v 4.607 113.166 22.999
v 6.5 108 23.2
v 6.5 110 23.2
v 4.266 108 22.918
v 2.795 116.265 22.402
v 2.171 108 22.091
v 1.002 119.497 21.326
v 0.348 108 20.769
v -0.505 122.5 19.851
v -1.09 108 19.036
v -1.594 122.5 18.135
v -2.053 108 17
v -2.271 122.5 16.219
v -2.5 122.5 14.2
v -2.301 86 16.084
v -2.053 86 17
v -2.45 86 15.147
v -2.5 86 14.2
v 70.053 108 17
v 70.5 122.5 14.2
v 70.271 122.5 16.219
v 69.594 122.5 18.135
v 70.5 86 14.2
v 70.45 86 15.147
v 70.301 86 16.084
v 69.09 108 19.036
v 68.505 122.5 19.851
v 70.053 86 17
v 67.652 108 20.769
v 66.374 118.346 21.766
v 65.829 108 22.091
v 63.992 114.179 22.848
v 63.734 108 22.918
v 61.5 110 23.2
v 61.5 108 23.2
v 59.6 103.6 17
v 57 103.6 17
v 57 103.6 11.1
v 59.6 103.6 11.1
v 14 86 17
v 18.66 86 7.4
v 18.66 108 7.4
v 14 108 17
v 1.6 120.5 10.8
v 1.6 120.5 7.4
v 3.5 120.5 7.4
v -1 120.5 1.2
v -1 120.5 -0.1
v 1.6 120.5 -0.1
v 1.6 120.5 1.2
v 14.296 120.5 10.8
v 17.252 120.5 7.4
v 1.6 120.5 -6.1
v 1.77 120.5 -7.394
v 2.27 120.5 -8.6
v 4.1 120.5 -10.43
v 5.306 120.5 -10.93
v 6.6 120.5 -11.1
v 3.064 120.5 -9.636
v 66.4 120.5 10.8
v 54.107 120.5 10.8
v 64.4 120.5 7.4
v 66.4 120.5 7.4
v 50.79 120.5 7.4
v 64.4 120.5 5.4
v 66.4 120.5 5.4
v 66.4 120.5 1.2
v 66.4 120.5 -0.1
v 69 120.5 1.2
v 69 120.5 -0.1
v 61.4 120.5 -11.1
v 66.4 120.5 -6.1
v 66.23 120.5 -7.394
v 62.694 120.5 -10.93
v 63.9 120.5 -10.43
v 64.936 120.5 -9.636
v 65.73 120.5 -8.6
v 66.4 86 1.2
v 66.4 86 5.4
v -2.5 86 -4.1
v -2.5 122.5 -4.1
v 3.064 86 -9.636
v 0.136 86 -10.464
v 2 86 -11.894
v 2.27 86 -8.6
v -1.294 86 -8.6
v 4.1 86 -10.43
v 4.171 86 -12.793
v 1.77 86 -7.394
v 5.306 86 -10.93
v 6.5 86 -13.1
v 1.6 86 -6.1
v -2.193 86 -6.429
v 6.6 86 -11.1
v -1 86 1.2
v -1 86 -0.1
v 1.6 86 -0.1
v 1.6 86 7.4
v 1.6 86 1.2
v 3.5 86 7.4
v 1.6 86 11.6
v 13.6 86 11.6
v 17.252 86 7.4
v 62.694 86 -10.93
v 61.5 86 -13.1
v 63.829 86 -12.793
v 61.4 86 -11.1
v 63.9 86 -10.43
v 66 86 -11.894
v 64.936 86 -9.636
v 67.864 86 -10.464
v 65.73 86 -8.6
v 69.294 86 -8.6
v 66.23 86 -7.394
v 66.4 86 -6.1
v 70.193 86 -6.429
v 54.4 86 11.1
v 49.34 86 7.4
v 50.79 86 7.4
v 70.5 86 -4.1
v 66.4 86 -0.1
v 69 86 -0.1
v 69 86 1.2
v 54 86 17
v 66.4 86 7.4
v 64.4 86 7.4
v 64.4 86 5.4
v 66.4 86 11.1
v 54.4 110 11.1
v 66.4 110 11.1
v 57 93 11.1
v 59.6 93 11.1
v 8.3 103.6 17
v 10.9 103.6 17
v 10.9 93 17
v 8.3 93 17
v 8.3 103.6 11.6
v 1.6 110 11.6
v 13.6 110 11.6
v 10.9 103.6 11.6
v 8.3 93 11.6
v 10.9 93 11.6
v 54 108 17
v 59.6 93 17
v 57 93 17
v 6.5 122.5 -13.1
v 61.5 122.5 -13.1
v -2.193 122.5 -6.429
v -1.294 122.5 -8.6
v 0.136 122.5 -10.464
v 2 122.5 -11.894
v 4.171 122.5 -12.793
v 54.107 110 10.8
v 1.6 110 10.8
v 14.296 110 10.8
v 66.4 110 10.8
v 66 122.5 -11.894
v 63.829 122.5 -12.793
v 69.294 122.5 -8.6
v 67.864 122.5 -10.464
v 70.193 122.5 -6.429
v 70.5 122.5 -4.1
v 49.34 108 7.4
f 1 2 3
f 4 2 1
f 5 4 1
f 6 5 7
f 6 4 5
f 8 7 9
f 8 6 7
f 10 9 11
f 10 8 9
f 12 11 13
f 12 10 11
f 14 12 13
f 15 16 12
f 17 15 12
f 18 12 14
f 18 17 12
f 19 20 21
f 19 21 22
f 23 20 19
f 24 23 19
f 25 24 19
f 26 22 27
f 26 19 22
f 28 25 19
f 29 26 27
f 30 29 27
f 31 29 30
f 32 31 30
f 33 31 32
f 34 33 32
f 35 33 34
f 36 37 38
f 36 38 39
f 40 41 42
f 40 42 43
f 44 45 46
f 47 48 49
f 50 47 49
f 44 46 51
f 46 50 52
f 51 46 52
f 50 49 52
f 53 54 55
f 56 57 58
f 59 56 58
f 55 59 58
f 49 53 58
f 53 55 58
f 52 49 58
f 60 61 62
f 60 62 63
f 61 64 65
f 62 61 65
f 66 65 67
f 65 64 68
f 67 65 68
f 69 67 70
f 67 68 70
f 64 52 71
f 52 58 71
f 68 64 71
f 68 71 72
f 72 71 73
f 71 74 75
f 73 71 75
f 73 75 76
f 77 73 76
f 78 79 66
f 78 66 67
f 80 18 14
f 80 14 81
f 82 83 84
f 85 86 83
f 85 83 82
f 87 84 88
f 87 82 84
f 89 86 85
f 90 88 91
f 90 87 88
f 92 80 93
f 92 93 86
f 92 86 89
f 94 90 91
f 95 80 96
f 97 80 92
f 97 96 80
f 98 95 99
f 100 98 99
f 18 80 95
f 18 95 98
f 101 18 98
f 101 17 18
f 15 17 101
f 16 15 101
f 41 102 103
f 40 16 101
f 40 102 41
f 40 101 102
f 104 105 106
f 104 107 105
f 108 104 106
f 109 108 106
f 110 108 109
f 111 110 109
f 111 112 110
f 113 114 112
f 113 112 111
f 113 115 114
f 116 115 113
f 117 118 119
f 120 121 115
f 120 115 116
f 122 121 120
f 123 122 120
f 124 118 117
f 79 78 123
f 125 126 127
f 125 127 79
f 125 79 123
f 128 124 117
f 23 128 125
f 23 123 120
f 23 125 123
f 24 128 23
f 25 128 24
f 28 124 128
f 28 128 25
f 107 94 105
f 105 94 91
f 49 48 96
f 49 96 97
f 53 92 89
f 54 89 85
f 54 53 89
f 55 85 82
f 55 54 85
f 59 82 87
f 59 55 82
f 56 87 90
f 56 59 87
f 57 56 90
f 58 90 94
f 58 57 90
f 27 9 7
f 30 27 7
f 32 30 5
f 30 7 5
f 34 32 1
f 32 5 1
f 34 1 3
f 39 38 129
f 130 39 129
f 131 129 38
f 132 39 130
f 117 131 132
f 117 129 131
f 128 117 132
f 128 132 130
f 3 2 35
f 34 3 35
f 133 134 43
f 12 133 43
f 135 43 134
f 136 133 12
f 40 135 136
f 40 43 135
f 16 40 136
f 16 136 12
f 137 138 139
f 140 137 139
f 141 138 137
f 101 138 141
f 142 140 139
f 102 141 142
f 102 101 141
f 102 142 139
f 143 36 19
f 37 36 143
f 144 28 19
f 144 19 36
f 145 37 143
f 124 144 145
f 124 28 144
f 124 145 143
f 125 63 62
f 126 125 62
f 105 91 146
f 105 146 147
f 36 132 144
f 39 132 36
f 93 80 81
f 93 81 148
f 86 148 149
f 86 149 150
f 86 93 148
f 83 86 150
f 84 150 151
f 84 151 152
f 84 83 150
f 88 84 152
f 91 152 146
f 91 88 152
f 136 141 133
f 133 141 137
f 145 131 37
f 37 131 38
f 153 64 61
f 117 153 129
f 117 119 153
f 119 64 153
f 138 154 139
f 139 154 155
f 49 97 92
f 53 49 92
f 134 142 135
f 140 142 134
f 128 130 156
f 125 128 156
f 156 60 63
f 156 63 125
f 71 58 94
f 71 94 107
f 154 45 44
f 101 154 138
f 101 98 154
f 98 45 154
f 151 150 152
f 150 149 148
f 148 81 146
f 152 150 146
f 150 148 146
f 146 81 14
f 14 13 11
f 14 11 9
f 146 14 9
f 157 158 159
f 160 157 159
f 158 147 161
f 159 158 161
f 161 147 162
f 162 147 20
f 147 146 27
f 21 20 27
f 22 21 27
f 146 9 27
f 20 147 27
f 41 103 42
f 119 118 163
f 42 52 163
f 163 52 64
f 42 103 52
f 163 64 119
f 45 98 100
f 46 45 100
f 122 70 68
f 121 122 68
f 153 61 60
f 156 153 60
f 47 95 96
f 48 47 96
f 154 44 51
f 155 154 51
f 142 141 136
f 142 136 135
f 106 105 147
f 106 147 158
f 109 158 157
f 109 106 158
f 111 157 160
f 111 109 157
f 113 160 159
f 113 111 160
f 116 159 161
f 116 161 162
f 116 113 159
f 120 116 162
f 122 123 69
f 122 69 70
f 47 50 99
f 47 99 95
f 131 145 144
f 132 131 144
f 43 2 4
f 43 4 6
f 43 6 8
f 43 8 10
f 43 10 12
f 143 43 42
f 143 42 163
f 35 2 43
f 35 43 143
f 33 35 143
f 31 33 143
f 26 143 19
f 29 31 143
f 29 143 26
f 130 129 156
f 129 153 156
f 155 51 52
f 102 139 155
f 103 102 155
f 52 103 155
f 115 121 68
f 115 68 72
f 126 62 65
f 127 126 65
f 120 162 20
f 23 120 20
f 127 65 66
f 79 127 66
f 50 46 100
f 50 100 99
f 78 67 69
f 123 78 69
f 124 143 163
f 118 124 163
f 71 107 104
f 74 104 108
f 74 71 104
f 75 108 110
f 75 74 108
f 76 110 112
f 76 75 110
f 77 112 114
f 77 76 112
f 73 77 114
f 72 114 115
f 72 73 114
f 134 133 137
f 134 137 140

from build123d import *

# Parameters (mm, degrees)
BOX030_W                             = 48
BOX030_H                             = 60
BOX030_DEPTH                         = 10
BOX028_W                             = 2.6
BOX028_H                             = 10.6
BOX028_DEPTH                         = 15
BOX027_W                             = 2.6
BOX027_H                             = 10.6
BOX027_DEPTH                         = 15
EXTRUDE076_DEPTH                     = 34.5
EXTRUDE076_ONTO_SKETCH082_ROLL_ANGLE = 90
EXTRUDE075_DEPTH                     = 34.5
EXTRUDE075_ONTO_SKETCH081_ROLL_ANGLE = 90
EXTRUDE077_DEPTH                     = 10.5
EXTRUDE077_ONTO_SKETCH083_ROLL_ANGLE = 90
EXTRUDE080_DEPTH                     = 100
EXTRUDE079_DEPTH                     = 2
EXTRUDE079_ONTO_SKETCH085_ROLL_ANGLE = 90
BOX029_W                             = 80
BOX029_H                             = 28
BOX029_DEPTH                         = 30
EXTRUDE078_DEPTH                     = 35.5
EXTRUDE078_ONTO_SKETCH084_ROLL_ANGLE = 90
BOX032_W                             = 48
BOX032_H                             = 60
BOX032_DEPTH                         = 35
BOX031_W                             = 48
BOX031_H                             = 60
BOX031_DEPTH                         = 35
BOX033_W                             = 48
BOX033_H                             = 60
BOX033_DEPTH                         = 35
EXTRUDE081_DEPTH                     = 2
EXTRUDE081_ONTO_SKETCH087_ROLL_ANGLE = 90


with BuildPart() as cube:
    # Box030 → Box030 (new body)
    with BuildSketch(Plane(origin=(11, 60.5, -2.6), x_dir=(1, 0, 0), z_dir=(0, 0, 1))):
        with Locations((24, 30)):
            Rectangle(BOX030_W, BOX030_H)
    extrude(amount=BOX030_DEPTH)


with BuildPart() as control_cutout_rec003:
    # Box028 → Box028 (new body)
    with BuildSketch(Plane(origin=(57, 93, 9), x_dir=(1, 0, 0), z_dir=(0, 0, 1))):
        with Locations((1.3, 5.3)):
            Rectangle(BOX028_W, BOX028_H)
    extrude(amount=BOX028_DEPTH)


with BuildPart() as button_cutouts_rec001:
    # Box027 → Box027 (new body)
    with BuildSketch(Plane(origin=(8.3, 93, 9), x_dir=(1, 0, 0), z_dir=(0, 0, 1))):
        with Locations((1.3, 5.3)):
            Rectangle(BOX027_W, BOX027_H)
    extrude(amount=BOX027_DEPTH)

    # Fusion041: union control_cutout_rec003
    add(control_cutout_rec003.part)


with BuildPart() as screen_cutout_shp002:
    # Sketch082 as drawn → Extrude076 (new)
    with BuildSketch(Plane.XY):
        Polygon((14, 17), (-5.5, 17), (-5.5, 25.6), (73.5, 25.6), (73.5, 17), (54, 17), (49, 6.7), (49, 6.6), (19, 6.6), (19, 6.7), align=None)
    extrude(amount=-EXTRUDE076_DEPTH)


with BuildPart() as screen_cutout_shp002_1:
    # Extrude076 onto Sketch082 roll: moved
    add(screen_cutout_shp002.part.rotate(Axis((0, 0, 0), (1, 0, 0)), EXTRUDE076_ONTO_SKETCH082_ROLL_ANGLE))


with BuildPart() as screen_cutout_shp002_2:
    # Extrude076 onto Sketch082 placement: moved
    add(screen_cutout_shp002_1.part.moved(Location((0, 86, 0))))


with BuildPart() as screen_frame002:
    # Sketch081 as drawn → Extrude075 (new)
    with BuildSketch(Plane.XY):
        with BuildLine():
            Line((-2.5, 14.2), (-2.5, 10.6))
            Line((-2.5, 10.6), (1.6, 10.6))
            Line((1.6, 10.6), (1.6, 11.6))
            Line((1.6, 11.6), (13.6, 11.6))
            Line((13.6, 11.6), (17.6, 7))
            Line((17.6, 7), (50.4, 7))
            Line((50.4, 7), (54.4, 11.1))
            Line((54.4, 11.1), (66.4, 11.1))
            Line((66.4, 11.1), (66.4, 10.6))
            Line((66.4, 10.6), (70.5, 10.6))
            Line((70.5, 10.6), (70.5, 14.2))
            ThreePointArc((70.5, 14.2), (67.863961, 20.563961), (61.5, 23.2))
            Line((6.5, 23.2), (61.5, 23.2))
            ThreePointArc((6.5, 23.2), (0.136039, 20.563961), (-2.5, 14.2))
        make_face()
    extrude(amount=-EXTRUDE075_DEPTH)


with BuildPart() as screen_frame002_1:
    # Extrude075 onto Sketch081 roll: moved
    add(screen_frame002.part.rotate(Axis((0, 0, 0), (1, 0, 0)), EXTRUDE075_ONTO_SKETCH081_ROLL_ANGLE))


with BuildPart() as screen_frame002_2:
    # Extrude075 onto Sketch081 placement: moved
    add(screen_frame002_1.part.moved(Location((0, 86, 0))))

    # Cut031: cut screen_cutout_shp002
    add(screen_cutout_shp002_2.part, mode=Mode.SUBTRACT)


with BuildPart() as cut032:
    # Sketch083 as drawn → Extrude077 (new)
    with BuildSketch(Plane.XY):
        Polygon((13.6, 12.2), (17.6, 7.2), (50.4, 7.2), (54.4, 12.2), align=None)
    extrude(amount=-EXTRUDE077_DEPTH)


with BuildPart() as cut032_1:
    # Extrude077 onto Sketch083 roll: moved
    add(cut032.part.rotate(Axis((0, 0, 0), (1, 0, 0)), EXTRUDE077_ONTO_SKETCH083_ROLL_ANGLE))


with BuildPart() as cut032_2:
    # Extrude077 onto Sketch083 placement: moved
    add(cut032_1.part.moved(Location((0, 110, 0))))

    # Fusion042: union screen_frame002
    add(screen_frame002_2.part)

    # Cut032: cut button_cutouts_rec001
    add(button_cutouts_rec001.part, mode=Mode.SUBTRACT)


with BuildPart() as round_cut002:
    # Sketch086 → Extrude080 (new body)
    with BuildSketch(Plane.YZ.offset(-14)):
        with BuildLine():
            Line((100, 23.2), (100, 26.2))
            Line((100, 26.2), (138, 26.2))
            Line((138, 26.2), (138, -11.8))
            Line((138, -11.8), (135, -11.8))
            Line((135, -11.8), (135, -1.8))
            ThreePointArc((135, -1.8), (127.67767, 15.87767), (110, 23.2))
            Line((100, 23.2), (110, 23.2))
        make_face()
    extrude(amount=EXTRUDE080_DEPTH)


with BuildPart() as extrude079:
    # Sketch085 as drawn → Extrude079 (new)
    with BuildSketch(Plane.XY):
        with BuildLine():
            Line((-2.5, 14.2), (-2.5, -4.1))
            ThreePointArc((-2.5, -4.1), (0.136039, -10.463961), (6.5, -13.1))
            Line((6.5, -13.1), (61.5, -13.1))
            ThreePointArc((61.5, -13.1), (67.863961, -10.463961), (70.5, -4.1))
            Line((70.5, -4.1), (70.5, 14.2))
            ThreePointArc((70.5, 14.2), (67.863961, 20.563961), (61.5, 23.2))
            Line((6.5, 23.2), (61.5, 23.2))
            ThreePointArc((6.5, 23.2), (0.136039, 20.563961), (-2.5, 14.2))
        make_face()
    extrude(amount=-EXTRUDE079_DEPTH)


with BuildPart() as extrude079_1:
    # Extrude079 onto Sketch085 roll: moved
    add(extrude079.part.rotate(Axis((0, 0, 0), (1, 0, 0)), EXTRUDE079_ONTO_SKETCH085_ROLL_ANGLE))


with BuildPart() as extrude079_2:
    # Extrude079 onto Sketch085 placement: moved
    add(extrude079_1.part.moved(Location((0, 120, 0))))


with BuildPart() as extrude079_3:
    # Extrude079 placement: moved
    add(extrude079_2.part.moved(Location((0, 0.5, 0))))


with BuildPart() as cube008:
    # Box029 → Box029 (new body)
    with BuildSketch(Plane(origin=(-5, 82, 10.6), x_dir=(1, 0, 0), z_dir=(0, 0, 1))):
        with Locations((40, 14)):
            Rectangle(BOX029_W, BOX029_H)
    extrude(amount=BOX029_DEPTH)


with BuildPart() as shell_upper004:
    # Sketch084 as drawn → Extrude078 (new)
    with BuildSketch(Plane.XY):
        with BuildLine():
            Line((-2.5, 14.2), (-2.5, -4.1))
            ThreePointArc((-2.5, -4.1), (0.136039, -10.463961), (6.5, -13.1))
            Line((6.5, -13.1), (61.5, -13.1))
            ThreePointArc((61.5, -13.1), (67.863961, -10.463961), (70.5, -4.1))
            Line((70.5, -4.1), (70.5, 14.2))
            ThreePointArc((70.5, 14.2), (67.863961, 20.563961), (61.5, 23.2))
            Line((6.5, 23.2), (61.5, 23.2))
            ThreePointArc((6.5, 23.2), (0.136039, 20.563961), (-2.5, 14.2))
        make_face()
        with BuildLine():
            Line((1.6, 1.2), (-1, 1.2))
            Line((-1, 1.2), (-1, -0.1))
            Line((-1, -0.1), (1.6, -0.1))
            Line((1.6, -0.1), (1.6, -6.1))
            ThreePointArc((1.6, -6.1), (3.064466, -9.635534), (6.6, -11.1))
            Line((6.6, -11.1), (61.4, -11.1))
            ThreePointArc((61.4, -11.1), (64.935534, -9.635534), (66.4, -6.1))
            Line((66.4, -0.1), (66.4, -6.1))
            Line((69, -0.1), (66.4, -0.1))
            Line((69, 1.2), (69, -0.1))
            Line((66.4, 1.2), (69, 1.2))
            Line((66.4, 5.4), (66.4, 1.2))
            Line((64.4, 5.4), (66.4, 5.4))
            Line((64.4, 7.4), (64.4, 5.4))
            Line((66.4, 7.4), (64.4, 7.4))
            Line((66.4, 10.6), (66.4, 7.4))
            Line((66.4, 10.6), (66.4, 10.8))
            Line((66.4, 10.8), (64.5, 10.8))
            Line((64.5, 10.8), (3.5, 10.8))
            Line((1.6, 10.8), (3.5, 10.8))
            Line((1.6, 10.6), (1.6, 10.8))
            Line((1.6, 10.6), (1.6, 7.4))
            Line((1.6, 7.4), (3.5, 7.4))
            Line((3.5, 7.4), (1.6, 1.2))
        make_face(mode=Mode.SUBTRACT)
    extrude(amount=EXTRUDE078_DEPTH)


with BuildPart() as shell_upper004_1:
    # Extrude078 onto Sketch084 roll: moved
    add(shell_upper004.part.rotate(Axis((0, 0, 0), (1, 0, 0)), EXTRUDE078_ONTO_SKETCH084_ROLL_ANGLE))


with BuildPart() as shell_upper004_2:
    # Extrude078 onto Sketch084 placement: moved
    add(shell_upper004_1.part.moved(Location((0, 120, 0))))


with BuildPart() as shell_upper004_3:
    # Extrude078 placement: moved
    add(shell_upper004_2.part.moved(Location((0, 1.5, 0))))

    # Cut033: cut Cube008
    add(cube008.part, mode=Mode.SUBTRACT)

    # Fusion043: union Extrude079
    add(extrude079_3.part)

    # Cut034: cut round_cut002
    add(round_cut002.part, mode=Mode.SUBTRACT)

    # Fusion044: union Cut032
    add(cut032_2.part)


with BuildPart() as cube010:
    # Box032 → Box032 (new body)
    with BuildSketch(Plane(origin=(54, 60.5, -20.6), x_dir=(1, 0, 0), z_dir=(0, 0, 1))):
        with Locations((24, 30)):
            Rectangle(BOX032_W, BOX032_H)
    extrude(amount=BOX032_DEPTH)


with BuildPart() as cube009:
    # Box031 → Box031 (new body)
    with BuildSketch(Plane(origin=(-33, 60.5, -21.6), x_dir=(1, 0, 0), z_dir=(0, 0, 1))):
        with Locations((24, 30)):
            Rectangle(BOX031_W, BOX031_H)
    extrude(amount=BOX031_DEPTH)


with BuildPart() as fusion045:
    # Box033 → Box033 (new body)
    with BuildSketch(Plane(origin=(11, 60.5, -32.6), x_dir=(1, 0, 0), z_dir=(0, 0, 1))):
        with Locations((24, 30)):
            Rectangle(BOX033_W, BOX033_H)
    extrude(amount=BOX033_DEPTH)

    # Fusion045: union Cube010, Cube009
    add(cube010.part)
    add(cube009.part)


with BuildPart() as shell_upper_tuned:
    # Sketch087 as drawn → Extrude081 (new)
    with BuildSketch(Plane.XY):
        with BuildLine():
            Line((-2.5, 14.2), (-2.5, -4.099997))
            ThreePointArc((-2.5, -4.099997), (0.136039, -10.463958), (6.5, -13.099997))
            Line((6.5, -13.099997), (61.498163, -13.099997))
            ThreePointArc((61.498163, -13.099997), (67.863423, -10.46342), (70.5, -4.09816))
            Line((70.5, -4.09816), (70.5, 14.2))
            ThreePointArc((70.5, 14.2), (67.863961, 20.563961), (61.5, 23.2))
            Line((6.5, 23.2), (61.5, 23.2))
            ThreePointArc((6.5, 23.2), (0.136039, 20.563961), (-2.5, 14.2))
        make_face()
        with BuildLine():
            Line((1.6, 1.200003), (-1, 1.200003))
            Line((-1, 1.200003), (-1, -0.099997))
            Line((-1, -0.099997), (1.6, -0.099997))
            Line((1.6, -0.099997), (1.6, -6.099997))
            ThreePointArc((1.6, -6.099997), (3.064466, -9.635531), (6.6, -11.099997))
            Line((6.6, -11.099997), (61.399986, -11.099997))
            ThreePointArc((61.399986, -11.099997), (64.936819, -9.634993), (66.401823, -6.09816))
            Line((66.401823, -0.09816), (66.401823, -6.09816))
            Line((69, -0.09816), (66.401823, -0.09816))
            Line((69, 1.20184), (69, -0.09816))
            Line((66.401823, 1.20184), (69, 1.20184))
            Line((66.401823, 5.40184), (66.401823, 1.20184))
            Line((64.3846, 5.40184), (66.401823, 5.40184))
            Line((64.3846, 10.90184), (64.3846, 5.40184))
            Line((54.2, 10.90184), (64.3846, 10.90184))
            Line((50.4, 7), (54.2, 10.90184))
            Line((17.6, 7), (50.4, 7))
            Line((14.2, 10.97071), (17.6, 7))
            Line((3.5, 10.97071), (14.2, 10.97071))
            Line((3.5, 7.47071), (3.5, 10.97071))
            Line((3.5, 7.47071), (1.6, 1.200003))
        make_face(mode=Mode.SUBTRACT)
    extrude(amount=-EXTRUDE081_DEPTH)


with BuildPart() as shell_upper_tuned_1:
    # Extrude081 onto Sketch087 roll: moved
    add(shell_upper_tuned.part.rotate(Axis((0, 0, 0), (1, 0, 0)), EXTRUDE081_ONTO_SKETCH087_ROLL_ANGLE))


with BuildPart() as shell_upper_tuned_2:
    # Extrude081 onto Sketch087 placement: moved
    add(shell_upper_tuned_1.part.moved(Location((0, 84, 0))))


with BuildPart() as shell_upper_tuned_3:
    # Extrude081 placement: moved
    add(shell_upper_tuned_2.part.moved(Location((0, 24, 0))))

    # Cut035: cut Fusion045
    add(fusion045.part, mode=Mode.SUBTRACT)

    # Fusion046: union shell_upper004
    add(shell_upper004_3.part)

    # Cut036: cut Cube
    add(cube.part, mode=Mode.SUBTRACT)


solid = shell_upper_tuned_3.part
